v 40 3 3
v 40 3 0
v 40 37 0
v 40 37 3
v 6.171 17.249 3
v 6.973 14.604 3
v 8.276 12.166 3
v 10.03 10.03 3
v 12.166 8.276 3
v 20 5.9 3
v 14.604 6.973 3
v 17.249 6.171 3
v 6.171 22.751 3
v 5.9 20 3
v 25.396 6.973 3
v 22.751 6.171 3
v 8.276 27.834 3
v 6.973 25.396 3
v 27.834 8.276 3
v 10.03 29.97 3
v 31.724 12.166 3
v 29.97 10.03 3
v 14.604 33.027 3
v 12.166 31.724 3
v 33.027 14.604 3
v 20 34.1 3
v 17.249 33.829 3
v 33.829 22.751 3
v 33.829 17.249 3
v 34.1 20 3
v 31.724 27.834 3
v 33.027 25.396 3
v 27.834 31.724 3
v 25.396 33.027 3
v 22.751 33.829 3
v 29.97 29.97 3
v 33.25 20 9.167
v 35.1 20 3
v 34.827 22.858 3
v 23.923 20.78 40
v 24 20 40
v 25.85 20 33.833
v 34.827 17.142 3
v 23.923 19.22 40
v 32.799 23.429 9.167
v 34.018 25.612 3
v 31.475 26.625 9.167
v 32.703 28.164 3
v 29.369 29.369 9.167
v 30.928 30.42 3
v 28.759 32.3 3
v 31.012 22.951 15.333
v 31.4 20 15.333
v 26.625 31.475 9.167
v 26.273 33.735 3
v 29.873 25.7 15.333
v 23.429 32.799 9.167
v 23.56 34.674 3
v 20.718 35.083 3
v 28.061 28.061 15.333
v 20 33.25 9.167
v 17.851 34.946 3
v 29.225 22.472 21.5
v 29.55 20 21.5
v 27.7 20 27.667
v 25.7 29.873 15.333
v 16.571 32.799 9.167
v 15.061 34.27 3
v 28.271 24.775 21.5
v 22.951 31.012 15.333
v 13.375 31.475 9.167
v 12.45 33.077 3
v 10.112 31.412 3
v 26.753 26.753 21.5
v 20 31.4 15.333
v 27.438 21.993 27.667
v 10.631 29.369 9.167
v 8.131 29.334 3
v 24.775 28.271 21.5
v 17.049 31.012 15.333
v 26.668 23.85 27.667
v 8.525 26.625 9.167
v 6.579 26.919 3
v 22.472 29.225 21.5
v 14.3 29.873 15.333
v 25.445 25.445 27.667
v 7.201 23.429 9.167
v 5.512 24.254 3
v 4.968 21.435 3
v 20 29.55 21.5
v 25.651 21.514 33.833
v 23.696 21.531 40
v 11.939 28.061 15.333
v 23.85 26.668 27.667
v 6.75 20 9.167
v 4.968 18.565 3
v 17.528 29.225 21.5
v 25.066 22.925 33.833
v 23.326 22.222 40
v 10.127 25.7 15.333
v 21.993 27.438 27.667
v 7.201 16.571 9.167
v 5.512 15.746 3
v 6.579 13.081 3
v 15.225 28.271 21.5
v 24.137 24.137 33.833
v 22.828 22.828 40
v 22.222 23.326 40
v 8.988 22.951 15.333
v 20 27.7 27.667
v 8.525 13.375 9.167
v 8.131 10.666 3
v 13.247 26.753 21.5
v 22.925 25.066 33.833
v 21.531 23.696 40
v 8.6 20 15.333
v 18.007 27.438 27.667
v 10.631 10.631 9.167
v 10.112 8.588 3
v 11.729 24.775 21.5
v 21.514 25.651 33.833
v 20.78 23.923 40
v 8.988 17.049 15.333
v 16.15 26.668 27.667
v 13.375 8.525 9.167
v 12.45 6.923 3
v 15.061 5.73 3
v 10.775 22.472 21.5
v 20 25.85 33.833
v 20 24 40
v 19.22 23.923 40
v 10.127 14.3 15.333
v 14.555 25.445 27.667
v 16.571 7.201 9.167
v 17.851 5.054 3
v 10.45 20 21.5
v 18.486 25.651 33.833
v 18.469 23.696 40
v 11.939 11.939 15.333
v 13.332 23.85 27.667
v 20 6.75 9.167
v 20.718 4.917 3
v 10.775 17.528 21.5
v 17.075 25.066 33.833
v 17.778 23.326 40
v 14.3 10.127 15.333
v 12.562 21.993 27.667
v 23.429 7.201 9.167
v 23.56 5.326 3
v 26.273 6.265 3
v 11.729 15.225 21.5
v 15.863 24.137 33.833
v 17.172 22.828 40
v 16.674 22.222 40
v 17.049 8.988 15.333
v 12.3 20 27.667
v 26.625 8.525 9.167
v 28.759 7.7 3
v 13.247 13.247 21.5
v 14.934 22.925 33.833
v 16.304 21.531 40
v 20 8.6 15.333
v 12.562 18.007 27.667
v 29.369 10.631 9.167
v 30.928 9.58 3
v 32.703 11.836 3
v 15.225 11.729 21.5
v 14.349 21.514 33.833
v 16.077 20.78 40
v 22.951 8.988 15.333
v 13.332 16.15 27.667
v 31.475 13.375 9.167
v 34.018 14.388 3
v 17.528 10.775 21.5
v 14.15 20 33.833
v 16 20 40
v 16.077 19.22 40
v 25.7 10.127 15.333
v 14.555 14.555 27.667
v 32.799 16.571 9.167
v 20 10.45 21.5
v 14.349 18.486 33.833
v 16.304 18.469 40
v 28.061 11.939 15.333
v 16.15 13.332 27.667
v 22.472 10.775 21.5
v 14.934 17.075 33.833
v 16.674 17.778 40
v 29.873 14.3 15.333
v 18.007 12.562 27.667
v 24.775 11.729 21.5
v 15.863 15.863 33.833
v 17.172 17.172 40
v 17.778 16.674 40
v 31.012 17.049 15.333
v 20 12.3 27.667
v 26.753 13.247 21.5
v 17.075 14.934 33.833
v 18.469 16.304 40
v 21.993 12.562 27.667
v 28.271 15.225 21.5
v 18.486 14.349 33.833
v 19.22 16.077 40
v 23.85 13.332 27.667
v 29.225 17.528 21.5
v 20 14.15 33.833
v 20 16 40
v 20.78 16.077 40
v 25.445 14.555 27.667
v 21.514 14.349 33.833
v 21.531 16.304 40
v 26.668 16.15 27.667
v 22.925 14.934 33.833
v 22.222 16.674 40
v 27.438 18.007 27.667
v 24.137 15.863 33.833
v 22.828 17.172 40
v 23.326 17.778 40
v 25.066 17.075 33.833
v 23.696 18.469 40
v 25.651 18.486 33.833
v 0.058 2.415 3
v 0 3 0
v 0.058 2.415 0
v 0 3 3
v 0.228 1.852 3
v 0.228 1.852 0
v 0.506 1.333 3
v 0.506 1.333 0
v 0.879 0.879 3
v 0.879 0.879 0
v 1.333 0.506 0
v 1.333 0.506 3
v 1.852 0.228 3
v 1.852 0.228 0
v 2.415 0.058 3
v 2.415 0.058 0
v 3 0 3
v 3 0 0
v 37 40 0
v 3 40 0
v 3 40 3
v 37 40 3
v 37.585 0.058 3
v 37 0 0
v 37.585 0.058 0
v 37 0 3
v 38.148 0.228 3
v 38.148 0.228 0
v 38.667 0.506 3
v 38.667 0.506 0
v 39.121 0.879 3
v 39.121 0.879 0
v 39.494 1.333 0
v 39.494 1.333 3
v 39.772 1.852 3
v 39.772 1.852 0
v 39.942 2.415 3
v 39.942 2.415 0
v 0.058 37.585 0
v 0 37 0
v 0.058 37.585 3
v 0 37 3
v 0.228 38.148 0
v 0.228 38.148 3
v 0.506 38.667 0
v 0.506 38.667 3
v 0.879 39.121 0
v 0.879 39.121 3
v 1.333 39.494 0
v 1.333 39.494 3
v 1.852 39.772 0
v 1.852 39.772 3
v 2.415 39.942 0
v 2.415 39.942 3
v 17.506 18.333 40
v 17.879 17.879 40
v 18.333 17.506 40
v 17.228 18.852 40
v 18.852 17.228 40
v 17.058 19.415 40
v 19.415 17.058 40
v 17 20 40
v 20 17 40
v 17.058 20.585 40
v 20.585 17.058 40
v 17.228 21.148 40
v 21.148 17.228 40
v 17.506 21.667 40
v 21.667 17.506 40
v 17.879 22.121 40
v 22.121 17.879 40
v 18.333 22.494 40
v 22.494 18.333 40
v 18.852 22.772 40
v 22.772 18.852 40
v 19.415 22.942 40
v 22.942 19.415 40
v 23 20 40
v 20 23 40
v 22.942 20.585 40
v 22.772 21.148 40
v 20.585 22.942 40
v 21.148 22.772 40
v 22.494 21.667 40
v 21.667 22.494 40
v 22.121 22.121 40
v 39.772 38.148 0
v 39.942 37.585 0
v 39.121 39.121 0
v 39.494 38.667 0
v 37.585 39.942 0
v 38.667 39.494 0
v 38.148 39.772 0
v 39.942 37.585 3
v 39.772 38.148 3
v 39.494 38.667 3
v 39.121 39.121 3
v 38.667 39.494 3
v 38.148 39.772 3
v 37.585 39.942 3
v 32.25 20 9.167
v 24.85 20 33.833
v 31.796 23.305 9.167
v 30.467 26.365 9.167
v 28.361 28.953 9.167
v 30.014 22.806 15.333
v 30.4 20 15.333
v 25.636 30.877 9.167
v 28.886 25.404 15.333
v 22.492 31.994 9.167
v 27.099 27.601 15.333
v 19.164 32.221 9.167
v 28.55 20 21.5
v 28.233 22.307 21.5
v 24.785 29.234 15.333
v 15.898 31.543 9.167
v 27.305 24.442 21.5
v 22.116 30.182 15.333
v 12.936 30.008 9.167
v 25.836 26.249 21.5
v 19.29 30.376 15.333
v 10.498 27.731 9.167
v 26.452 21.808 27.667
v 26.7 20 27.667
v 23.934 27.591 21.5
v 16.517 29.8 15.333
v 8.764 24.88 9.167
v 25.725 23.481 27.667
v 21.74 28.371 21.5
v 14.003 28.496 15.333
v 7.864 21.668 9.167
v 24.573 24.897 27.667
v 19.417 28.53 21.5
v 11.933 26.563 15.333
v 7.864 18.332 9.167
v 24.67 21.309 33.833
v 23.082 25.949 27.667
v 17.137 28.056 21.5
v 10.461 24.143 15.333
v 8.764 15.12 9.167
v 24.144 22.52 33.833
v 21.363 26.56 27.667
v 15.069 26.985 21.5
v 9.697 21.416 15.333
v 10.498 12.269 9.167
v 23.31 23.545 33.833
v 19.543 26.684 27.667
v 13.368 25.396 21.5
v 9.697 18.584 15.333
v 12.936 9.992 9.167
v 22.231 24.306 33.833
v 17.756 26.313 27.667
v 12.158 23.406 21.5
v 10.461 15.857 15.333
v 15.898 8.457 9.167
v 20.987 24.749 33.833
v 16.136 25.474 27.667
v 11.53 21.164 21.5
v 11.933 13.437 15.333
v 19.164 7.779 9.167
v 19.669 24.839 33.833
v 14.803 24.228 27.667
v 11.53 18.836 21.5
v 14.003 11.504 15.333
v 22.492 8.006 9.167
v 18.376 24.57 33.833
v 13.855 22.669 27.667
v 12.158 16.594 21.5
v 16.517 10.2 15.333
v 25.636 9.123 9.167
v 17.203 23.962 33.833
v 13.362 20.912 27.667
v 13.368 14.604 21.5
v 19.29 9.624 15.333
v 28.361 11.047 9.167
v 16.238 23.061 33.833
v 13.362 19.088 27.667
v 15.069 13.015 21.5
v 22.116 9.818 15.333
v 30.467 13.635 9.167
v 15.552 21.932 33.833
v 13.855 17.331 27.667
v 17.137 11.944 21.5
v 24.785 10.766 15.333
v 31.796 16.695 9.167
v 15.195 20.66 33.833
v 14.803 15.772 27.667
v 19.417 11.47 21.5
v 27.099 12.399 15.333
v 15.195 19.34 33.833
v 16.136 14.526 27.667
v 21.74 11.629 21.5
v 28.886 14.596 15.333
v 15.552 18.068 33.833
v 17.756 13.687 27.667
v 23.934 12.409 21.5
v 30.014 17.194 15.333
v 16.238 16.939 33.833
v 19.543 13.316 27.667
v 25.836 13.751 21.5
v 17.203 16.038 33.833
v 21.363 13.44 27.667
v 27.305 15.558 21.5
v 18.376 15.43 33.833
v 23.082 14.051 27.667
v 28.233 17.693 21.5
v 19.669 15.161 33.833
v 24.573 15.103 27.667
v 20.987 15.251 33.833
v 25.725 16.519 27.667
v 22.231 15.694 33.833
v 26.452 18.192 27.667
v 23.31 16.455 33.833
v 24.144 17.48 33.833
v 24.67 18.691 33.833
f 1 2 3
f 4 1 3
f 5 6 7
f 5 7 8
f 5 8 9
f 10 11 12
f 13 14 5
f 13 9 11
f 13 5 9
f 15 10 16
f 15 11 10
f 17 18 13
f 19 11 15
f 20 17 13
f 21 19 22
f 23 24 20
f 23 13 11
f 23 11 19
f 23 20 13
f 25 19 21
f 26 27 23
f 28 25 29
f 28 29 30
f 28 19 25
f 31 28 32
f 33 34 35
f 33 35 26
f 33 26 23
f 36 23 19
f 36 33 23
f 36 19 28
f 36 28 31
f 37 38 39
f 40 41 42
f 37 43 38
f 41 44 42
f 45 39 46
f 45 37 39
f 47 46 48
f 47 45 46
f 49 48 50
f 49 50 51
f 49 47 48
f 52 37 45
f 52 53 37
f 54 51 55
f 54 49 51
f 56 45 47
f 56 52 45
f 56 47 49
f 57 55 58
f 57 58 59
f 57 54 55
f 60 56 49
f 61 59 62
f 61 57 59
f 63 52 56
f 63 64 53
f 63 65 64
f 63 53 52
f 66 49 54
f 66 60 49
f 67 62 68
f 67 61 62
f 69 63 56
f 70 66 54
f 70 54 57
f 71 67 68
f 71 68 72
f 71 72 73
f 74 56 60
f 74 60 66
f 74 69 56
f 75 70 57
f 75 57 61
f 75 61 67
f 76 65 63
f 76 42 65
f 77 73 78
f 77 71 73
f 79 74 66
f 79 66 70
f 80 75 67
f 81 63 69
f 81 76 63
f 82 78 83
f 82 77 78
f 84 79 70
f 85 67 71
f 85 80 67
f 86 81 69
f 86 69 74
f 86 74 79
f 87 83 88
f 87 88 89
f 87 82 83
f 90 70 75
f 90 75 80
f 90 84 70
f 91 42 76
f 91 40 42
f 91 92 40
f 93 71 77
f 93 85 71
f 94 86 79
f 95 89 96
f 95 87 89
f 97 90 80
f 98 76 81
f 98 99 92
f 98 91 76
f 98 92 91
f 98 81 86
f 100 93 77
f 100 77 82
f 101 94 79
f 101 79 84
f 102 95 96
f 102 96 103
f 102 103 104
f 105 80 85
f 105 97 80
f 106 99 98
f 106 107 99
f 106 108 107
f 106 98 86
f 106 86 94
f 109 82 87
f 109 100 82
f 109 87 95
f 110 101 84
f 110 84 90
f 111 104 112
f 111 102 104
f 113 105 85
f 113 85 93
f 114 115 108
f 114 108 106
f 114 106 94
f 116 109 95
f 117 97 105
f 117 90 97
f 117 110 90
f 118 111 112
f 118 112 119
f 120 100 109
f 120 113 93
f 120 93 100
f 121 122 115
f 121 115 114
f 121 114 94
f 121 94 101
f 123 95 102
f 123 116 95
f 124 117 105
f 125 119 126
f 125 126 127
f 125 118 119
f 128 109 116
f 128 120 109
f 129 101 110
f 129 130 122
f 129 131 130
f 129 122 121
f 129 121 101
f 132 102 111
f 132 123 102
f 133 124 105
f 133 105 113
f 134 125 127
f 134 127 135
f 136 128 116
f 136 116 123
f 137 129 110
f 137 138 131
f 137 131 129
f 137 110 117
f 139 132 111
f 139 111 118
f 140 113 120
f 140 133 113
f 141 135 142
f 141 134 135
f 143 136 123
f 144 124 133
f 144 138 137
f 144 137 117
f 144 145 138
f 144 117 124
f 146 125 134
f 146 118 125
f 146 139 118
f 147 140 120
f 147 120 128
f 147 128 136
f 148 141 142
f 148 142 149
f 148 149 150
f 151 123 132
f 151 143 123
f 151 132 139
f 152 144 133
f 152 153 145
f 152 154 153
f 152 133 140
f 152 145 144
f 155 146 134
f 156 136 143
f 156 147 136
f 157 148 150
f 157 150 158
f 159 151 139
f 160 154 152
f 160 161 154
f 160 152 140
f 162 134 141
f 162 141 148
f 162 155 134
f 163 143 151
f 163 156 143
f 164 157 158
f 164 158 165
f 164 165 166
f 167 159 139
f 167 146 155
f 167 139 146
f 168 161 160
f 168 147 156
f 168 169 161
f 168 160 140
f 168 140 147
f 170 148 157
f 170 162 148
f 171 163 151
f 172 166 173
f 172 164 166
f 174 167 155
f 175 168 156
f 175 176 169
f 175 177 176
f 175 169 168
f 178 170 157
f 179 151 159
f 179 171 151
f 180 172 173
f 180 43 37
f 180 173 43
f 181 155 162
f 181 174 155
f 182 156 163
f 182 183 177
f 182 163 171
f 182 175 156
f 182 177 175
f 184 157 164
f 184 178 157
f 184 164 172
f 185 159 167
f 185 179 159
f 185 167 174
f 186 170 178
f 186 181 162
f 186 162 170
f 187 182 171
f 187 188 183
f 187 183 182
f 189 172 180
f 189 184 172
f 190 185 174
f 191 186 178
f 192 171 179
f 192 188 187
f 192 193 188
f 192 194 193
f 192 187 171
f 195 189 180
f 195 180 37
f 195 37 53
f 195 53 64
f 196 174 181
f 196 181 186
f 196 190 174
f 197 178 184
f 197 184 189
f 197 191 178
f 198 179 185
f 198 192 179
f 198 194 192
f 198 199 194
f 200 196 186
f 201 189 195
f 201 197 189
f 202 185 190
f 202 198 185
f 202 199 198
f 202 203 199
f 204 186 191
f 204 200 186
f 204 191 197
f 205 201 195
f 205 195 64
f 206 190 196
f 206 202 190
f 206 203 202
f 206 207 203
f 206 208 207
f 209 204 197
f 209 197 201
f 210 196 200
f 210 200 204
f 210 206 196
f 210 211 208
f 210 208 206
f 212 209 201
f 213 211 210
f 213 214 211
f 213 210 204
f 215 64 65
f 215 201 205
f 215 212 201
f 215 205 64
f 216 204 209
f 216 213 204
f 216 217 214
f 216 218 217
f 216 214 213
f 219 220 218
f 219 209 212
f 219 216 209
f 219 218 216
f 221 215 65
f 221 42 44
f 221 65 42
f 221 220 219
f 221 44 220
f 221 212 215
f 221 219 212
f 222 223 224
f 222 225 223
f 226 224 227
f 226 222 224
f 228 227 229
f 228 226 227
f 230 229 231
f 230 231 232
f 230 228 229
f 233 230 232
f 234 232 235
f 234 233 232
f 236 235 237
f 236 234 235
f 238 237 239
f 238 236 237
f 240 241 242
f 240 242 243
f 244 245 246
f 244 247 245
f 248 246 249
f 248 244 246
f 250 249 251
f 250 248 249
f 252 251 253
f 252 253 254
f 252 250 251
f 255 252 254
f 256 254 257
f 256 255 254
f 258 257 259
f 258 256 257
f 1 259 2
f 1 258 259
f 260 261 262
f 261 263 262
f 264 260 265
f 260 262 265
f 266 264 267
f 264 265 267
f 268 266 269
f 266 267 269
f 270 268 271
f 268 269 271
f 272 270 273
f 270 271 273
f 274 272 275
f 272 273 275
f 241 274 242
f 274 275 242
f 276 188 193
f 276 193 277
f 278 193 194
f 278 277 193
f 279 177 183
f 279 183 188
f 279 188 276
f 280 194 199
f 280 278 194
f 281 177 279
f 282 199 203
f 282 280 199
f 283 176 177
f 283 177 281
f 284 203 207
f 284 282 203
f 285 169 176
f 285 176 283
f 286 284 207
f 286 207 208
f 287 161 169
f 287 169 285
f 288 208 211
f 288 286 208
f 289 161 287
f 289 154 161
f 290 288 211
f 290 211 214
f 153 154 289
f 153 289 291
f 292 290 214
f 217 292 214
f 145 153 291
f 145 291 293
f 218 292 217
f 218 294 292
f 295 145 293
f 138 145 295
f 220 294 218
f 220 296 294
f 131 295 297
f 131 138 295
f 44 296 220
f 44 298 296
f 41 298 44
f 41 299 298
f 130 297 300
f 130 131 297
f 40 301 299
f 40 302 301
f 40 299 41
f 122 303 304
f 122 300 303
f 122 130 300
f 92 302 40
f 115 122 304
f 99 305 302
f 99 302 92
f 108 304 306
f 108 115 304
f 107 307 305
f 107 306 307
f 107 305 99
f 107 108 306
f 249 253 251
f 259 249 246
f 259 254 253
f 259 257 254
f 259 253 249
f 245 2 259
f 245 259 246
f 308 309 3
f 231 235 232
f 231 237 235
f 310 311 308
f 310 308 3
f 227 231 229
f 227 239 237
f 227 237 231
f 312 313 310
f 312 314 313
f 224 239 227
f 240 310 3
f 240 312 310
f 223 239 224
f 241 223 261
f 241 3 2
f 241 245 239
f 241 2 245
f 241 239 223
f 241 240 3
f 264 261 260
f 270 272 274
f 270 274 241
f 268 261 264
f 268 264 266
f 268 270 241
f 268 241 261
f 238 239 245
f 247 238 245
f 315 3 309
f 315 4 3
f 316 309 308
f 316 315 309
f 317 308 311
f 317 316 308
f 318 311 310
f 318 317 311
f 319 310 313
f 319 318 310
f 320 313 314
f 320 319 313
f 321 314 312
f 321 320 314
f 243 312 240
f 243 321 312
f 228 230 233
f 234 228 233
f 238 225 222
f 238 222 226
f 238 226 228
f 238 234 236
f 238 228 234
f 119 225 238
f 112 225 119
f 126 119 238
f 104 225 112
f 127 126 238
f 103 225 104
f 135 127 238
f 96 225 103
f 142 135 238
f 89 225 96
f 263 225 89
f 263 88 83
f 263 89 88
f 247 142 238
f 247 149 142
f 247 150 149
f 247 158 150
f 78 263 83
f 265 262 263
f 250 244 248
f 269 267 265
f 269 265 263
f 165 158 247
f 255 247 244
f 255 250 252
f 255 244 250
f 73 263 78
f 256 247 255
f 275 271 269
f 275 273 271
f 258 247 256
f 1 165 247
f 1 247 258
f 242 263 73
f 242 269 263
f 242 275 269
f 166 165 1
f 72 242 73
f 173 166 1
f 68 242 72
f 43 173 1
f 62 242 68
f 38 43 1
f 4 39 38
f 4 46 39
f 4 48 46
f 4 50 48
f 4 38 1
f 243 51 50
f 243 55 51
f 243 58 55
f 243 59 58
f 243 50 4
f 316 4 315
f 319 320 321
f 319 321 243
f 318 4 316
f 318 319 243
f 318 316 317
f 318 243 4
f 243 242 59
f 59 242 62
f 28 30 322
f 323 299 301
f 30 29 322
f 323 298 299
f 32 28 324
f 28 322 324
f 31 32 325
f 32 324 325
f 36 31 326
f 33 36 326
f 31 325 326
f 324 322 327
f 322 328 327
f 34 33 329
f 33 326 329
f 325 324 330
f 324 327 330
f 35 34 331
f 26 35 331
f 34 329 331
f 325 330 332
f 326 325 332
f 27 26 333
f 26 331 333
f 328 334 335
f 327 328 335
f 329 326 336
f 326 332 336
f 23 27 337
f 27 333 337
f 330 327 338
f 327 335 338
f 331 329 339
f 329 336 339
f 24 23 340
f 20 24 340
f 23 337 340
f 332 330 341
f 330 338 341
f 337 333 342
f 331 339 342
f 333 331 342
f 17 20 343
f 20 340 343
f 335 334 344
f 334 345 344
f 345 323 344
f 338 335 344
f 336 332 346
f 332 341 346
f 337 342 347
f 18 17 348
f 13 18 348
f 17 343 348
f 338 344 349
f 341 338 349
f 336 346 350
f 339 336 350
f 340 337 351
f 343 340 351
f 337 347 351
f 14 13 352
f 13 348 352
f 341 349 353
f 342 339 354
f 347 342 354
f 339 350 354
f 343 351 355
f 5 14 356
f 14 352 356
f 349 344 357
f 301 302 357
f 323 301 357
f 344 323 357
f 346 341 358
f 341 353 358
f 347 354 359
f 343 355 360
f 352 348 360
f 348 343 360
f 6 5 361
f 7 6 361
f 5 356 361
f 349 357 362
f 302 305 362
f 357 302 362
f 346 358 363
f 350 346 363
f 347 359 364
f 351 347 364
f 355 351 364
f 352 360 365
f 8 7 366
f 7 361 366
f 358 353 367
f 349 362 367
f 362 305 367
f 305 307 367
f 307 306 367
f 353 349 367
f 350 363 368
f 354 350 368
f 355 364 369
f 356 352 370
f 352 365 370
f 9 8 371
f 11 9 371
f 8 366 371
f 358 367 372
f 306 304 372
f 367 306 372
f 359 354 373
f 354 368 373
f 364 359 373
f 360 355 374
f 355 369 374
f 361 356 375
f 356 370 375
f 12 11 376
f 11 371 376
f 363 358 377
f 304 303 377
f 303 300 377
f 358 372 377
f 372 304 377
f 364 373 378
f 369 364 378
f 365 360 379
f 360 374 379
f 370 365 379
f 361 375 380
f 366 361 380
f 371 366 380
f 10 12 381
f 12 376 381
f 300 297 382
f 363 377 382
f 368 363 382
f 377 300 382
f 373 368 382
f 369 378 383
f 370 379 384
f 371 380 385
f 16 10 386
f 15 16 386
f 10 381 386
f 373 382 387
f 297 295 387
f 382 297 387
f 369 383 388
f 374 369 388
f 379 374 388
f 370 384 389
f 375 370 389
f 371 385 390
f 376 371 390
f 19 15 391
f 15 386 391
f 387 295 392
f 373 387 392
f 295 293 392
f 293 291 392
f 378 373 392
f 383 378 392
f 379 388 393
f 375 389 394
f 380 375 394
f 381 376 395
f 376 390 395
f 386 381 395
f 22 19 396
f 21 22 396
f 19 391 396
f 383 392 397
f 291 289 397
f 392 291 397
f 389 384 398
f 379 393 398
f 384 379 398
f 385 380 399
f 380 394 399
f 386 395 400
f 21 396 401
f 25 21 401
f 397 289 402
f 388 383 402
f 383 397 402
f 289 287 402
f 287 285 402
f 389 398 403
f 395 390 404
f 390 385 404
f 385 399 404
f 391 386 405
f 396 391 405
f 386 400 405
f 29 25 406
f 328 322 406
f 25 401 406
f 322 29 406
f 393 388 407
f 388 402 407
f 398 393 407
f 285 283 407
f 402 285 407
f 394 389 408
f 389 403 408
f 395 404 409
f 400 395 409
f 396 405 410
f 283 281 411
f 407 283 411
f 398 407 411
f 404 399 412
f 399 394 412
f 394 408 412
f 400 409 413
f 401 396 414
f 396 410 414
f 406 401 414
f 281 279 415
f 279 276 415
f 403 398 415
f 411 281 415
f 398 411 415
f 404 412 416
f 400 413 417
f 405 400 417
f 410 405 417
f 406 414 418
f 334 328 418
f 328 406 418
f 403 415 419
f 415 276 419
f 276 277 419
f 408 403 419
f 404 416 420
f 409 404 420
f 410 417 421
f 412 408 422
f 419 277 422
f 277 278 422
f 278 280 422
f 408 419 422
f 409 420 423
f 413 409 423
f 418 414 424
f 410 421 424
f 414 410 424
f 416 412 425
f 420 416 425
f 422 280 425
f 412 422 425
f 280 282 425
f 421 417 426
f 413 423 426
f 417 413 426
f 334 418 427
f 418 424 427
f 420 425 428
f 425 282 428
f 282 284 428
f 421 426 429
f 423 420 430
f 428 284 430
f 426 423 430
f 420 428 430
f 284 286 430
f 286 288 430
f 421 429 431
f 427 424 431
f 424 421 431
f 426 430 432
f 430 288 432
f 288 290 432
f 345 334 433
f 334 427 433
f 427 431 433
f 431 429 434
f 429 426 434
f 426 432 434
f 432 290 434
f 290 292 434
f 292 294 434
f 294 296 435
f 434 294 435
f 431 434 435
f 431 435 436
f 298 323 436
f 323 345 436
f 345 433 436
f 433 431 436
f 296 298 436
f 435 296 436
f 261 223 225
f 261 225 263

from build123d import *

# Parameters (mm, degrees)
BOX_W     = 40
BOX_H     = 40
BOX_DEPTH = 3
FILLET_R  = 3


with BuildPart() as con001:
    # Cone001 → Cone001 (revolve)
    with BuildSketch(Plane.XZ):
        Polygon((0, 0), (15, 0), (3, 40), (0, 40), align=None)
    revolve(axis=Axis((0, 0, 0), (0, 0, 1)))


with BuildPart() as cut:
    # Cone → Cone (revolve)
    with BuildSketch(Plane.XZ):
        Polygon((0, 0), (16, 0), (4, 40), (0, 40), align=None)
    revolve(axis=Axis((0, 0, 0), (0, 0, 1)))

    # Cut: cut Con001
    add(con001.part, mode=Mode.SUBTRACT)


with BuildPart() as cut_1:
    # Cut placement: moved
    add(cut.part.moved(Location((20, 20, 0))))


with BuildPart() as fusion:
    # Box → Box (new body)
    with BuildSketch(Plane.XY):
        with Locations((20, 20)):
            Rectangle(BOX_W, BOX_H)
    extrude(amount=BOX_DEPTH)

    # Fillet
    fillet_edges = [fusion.edges().sort_by_distance(p)[0] for p in [
        (0, 0, 1.5),
        (0, 40, 1.5),
        (40, 0, 1.5),
        (40, 40, 1.5),
    ]]
    fillet(fillet_edges, radius=FILLET_R)

    # Fusion: union Cut
    add(cut_1.part)


solid = fusion.part
